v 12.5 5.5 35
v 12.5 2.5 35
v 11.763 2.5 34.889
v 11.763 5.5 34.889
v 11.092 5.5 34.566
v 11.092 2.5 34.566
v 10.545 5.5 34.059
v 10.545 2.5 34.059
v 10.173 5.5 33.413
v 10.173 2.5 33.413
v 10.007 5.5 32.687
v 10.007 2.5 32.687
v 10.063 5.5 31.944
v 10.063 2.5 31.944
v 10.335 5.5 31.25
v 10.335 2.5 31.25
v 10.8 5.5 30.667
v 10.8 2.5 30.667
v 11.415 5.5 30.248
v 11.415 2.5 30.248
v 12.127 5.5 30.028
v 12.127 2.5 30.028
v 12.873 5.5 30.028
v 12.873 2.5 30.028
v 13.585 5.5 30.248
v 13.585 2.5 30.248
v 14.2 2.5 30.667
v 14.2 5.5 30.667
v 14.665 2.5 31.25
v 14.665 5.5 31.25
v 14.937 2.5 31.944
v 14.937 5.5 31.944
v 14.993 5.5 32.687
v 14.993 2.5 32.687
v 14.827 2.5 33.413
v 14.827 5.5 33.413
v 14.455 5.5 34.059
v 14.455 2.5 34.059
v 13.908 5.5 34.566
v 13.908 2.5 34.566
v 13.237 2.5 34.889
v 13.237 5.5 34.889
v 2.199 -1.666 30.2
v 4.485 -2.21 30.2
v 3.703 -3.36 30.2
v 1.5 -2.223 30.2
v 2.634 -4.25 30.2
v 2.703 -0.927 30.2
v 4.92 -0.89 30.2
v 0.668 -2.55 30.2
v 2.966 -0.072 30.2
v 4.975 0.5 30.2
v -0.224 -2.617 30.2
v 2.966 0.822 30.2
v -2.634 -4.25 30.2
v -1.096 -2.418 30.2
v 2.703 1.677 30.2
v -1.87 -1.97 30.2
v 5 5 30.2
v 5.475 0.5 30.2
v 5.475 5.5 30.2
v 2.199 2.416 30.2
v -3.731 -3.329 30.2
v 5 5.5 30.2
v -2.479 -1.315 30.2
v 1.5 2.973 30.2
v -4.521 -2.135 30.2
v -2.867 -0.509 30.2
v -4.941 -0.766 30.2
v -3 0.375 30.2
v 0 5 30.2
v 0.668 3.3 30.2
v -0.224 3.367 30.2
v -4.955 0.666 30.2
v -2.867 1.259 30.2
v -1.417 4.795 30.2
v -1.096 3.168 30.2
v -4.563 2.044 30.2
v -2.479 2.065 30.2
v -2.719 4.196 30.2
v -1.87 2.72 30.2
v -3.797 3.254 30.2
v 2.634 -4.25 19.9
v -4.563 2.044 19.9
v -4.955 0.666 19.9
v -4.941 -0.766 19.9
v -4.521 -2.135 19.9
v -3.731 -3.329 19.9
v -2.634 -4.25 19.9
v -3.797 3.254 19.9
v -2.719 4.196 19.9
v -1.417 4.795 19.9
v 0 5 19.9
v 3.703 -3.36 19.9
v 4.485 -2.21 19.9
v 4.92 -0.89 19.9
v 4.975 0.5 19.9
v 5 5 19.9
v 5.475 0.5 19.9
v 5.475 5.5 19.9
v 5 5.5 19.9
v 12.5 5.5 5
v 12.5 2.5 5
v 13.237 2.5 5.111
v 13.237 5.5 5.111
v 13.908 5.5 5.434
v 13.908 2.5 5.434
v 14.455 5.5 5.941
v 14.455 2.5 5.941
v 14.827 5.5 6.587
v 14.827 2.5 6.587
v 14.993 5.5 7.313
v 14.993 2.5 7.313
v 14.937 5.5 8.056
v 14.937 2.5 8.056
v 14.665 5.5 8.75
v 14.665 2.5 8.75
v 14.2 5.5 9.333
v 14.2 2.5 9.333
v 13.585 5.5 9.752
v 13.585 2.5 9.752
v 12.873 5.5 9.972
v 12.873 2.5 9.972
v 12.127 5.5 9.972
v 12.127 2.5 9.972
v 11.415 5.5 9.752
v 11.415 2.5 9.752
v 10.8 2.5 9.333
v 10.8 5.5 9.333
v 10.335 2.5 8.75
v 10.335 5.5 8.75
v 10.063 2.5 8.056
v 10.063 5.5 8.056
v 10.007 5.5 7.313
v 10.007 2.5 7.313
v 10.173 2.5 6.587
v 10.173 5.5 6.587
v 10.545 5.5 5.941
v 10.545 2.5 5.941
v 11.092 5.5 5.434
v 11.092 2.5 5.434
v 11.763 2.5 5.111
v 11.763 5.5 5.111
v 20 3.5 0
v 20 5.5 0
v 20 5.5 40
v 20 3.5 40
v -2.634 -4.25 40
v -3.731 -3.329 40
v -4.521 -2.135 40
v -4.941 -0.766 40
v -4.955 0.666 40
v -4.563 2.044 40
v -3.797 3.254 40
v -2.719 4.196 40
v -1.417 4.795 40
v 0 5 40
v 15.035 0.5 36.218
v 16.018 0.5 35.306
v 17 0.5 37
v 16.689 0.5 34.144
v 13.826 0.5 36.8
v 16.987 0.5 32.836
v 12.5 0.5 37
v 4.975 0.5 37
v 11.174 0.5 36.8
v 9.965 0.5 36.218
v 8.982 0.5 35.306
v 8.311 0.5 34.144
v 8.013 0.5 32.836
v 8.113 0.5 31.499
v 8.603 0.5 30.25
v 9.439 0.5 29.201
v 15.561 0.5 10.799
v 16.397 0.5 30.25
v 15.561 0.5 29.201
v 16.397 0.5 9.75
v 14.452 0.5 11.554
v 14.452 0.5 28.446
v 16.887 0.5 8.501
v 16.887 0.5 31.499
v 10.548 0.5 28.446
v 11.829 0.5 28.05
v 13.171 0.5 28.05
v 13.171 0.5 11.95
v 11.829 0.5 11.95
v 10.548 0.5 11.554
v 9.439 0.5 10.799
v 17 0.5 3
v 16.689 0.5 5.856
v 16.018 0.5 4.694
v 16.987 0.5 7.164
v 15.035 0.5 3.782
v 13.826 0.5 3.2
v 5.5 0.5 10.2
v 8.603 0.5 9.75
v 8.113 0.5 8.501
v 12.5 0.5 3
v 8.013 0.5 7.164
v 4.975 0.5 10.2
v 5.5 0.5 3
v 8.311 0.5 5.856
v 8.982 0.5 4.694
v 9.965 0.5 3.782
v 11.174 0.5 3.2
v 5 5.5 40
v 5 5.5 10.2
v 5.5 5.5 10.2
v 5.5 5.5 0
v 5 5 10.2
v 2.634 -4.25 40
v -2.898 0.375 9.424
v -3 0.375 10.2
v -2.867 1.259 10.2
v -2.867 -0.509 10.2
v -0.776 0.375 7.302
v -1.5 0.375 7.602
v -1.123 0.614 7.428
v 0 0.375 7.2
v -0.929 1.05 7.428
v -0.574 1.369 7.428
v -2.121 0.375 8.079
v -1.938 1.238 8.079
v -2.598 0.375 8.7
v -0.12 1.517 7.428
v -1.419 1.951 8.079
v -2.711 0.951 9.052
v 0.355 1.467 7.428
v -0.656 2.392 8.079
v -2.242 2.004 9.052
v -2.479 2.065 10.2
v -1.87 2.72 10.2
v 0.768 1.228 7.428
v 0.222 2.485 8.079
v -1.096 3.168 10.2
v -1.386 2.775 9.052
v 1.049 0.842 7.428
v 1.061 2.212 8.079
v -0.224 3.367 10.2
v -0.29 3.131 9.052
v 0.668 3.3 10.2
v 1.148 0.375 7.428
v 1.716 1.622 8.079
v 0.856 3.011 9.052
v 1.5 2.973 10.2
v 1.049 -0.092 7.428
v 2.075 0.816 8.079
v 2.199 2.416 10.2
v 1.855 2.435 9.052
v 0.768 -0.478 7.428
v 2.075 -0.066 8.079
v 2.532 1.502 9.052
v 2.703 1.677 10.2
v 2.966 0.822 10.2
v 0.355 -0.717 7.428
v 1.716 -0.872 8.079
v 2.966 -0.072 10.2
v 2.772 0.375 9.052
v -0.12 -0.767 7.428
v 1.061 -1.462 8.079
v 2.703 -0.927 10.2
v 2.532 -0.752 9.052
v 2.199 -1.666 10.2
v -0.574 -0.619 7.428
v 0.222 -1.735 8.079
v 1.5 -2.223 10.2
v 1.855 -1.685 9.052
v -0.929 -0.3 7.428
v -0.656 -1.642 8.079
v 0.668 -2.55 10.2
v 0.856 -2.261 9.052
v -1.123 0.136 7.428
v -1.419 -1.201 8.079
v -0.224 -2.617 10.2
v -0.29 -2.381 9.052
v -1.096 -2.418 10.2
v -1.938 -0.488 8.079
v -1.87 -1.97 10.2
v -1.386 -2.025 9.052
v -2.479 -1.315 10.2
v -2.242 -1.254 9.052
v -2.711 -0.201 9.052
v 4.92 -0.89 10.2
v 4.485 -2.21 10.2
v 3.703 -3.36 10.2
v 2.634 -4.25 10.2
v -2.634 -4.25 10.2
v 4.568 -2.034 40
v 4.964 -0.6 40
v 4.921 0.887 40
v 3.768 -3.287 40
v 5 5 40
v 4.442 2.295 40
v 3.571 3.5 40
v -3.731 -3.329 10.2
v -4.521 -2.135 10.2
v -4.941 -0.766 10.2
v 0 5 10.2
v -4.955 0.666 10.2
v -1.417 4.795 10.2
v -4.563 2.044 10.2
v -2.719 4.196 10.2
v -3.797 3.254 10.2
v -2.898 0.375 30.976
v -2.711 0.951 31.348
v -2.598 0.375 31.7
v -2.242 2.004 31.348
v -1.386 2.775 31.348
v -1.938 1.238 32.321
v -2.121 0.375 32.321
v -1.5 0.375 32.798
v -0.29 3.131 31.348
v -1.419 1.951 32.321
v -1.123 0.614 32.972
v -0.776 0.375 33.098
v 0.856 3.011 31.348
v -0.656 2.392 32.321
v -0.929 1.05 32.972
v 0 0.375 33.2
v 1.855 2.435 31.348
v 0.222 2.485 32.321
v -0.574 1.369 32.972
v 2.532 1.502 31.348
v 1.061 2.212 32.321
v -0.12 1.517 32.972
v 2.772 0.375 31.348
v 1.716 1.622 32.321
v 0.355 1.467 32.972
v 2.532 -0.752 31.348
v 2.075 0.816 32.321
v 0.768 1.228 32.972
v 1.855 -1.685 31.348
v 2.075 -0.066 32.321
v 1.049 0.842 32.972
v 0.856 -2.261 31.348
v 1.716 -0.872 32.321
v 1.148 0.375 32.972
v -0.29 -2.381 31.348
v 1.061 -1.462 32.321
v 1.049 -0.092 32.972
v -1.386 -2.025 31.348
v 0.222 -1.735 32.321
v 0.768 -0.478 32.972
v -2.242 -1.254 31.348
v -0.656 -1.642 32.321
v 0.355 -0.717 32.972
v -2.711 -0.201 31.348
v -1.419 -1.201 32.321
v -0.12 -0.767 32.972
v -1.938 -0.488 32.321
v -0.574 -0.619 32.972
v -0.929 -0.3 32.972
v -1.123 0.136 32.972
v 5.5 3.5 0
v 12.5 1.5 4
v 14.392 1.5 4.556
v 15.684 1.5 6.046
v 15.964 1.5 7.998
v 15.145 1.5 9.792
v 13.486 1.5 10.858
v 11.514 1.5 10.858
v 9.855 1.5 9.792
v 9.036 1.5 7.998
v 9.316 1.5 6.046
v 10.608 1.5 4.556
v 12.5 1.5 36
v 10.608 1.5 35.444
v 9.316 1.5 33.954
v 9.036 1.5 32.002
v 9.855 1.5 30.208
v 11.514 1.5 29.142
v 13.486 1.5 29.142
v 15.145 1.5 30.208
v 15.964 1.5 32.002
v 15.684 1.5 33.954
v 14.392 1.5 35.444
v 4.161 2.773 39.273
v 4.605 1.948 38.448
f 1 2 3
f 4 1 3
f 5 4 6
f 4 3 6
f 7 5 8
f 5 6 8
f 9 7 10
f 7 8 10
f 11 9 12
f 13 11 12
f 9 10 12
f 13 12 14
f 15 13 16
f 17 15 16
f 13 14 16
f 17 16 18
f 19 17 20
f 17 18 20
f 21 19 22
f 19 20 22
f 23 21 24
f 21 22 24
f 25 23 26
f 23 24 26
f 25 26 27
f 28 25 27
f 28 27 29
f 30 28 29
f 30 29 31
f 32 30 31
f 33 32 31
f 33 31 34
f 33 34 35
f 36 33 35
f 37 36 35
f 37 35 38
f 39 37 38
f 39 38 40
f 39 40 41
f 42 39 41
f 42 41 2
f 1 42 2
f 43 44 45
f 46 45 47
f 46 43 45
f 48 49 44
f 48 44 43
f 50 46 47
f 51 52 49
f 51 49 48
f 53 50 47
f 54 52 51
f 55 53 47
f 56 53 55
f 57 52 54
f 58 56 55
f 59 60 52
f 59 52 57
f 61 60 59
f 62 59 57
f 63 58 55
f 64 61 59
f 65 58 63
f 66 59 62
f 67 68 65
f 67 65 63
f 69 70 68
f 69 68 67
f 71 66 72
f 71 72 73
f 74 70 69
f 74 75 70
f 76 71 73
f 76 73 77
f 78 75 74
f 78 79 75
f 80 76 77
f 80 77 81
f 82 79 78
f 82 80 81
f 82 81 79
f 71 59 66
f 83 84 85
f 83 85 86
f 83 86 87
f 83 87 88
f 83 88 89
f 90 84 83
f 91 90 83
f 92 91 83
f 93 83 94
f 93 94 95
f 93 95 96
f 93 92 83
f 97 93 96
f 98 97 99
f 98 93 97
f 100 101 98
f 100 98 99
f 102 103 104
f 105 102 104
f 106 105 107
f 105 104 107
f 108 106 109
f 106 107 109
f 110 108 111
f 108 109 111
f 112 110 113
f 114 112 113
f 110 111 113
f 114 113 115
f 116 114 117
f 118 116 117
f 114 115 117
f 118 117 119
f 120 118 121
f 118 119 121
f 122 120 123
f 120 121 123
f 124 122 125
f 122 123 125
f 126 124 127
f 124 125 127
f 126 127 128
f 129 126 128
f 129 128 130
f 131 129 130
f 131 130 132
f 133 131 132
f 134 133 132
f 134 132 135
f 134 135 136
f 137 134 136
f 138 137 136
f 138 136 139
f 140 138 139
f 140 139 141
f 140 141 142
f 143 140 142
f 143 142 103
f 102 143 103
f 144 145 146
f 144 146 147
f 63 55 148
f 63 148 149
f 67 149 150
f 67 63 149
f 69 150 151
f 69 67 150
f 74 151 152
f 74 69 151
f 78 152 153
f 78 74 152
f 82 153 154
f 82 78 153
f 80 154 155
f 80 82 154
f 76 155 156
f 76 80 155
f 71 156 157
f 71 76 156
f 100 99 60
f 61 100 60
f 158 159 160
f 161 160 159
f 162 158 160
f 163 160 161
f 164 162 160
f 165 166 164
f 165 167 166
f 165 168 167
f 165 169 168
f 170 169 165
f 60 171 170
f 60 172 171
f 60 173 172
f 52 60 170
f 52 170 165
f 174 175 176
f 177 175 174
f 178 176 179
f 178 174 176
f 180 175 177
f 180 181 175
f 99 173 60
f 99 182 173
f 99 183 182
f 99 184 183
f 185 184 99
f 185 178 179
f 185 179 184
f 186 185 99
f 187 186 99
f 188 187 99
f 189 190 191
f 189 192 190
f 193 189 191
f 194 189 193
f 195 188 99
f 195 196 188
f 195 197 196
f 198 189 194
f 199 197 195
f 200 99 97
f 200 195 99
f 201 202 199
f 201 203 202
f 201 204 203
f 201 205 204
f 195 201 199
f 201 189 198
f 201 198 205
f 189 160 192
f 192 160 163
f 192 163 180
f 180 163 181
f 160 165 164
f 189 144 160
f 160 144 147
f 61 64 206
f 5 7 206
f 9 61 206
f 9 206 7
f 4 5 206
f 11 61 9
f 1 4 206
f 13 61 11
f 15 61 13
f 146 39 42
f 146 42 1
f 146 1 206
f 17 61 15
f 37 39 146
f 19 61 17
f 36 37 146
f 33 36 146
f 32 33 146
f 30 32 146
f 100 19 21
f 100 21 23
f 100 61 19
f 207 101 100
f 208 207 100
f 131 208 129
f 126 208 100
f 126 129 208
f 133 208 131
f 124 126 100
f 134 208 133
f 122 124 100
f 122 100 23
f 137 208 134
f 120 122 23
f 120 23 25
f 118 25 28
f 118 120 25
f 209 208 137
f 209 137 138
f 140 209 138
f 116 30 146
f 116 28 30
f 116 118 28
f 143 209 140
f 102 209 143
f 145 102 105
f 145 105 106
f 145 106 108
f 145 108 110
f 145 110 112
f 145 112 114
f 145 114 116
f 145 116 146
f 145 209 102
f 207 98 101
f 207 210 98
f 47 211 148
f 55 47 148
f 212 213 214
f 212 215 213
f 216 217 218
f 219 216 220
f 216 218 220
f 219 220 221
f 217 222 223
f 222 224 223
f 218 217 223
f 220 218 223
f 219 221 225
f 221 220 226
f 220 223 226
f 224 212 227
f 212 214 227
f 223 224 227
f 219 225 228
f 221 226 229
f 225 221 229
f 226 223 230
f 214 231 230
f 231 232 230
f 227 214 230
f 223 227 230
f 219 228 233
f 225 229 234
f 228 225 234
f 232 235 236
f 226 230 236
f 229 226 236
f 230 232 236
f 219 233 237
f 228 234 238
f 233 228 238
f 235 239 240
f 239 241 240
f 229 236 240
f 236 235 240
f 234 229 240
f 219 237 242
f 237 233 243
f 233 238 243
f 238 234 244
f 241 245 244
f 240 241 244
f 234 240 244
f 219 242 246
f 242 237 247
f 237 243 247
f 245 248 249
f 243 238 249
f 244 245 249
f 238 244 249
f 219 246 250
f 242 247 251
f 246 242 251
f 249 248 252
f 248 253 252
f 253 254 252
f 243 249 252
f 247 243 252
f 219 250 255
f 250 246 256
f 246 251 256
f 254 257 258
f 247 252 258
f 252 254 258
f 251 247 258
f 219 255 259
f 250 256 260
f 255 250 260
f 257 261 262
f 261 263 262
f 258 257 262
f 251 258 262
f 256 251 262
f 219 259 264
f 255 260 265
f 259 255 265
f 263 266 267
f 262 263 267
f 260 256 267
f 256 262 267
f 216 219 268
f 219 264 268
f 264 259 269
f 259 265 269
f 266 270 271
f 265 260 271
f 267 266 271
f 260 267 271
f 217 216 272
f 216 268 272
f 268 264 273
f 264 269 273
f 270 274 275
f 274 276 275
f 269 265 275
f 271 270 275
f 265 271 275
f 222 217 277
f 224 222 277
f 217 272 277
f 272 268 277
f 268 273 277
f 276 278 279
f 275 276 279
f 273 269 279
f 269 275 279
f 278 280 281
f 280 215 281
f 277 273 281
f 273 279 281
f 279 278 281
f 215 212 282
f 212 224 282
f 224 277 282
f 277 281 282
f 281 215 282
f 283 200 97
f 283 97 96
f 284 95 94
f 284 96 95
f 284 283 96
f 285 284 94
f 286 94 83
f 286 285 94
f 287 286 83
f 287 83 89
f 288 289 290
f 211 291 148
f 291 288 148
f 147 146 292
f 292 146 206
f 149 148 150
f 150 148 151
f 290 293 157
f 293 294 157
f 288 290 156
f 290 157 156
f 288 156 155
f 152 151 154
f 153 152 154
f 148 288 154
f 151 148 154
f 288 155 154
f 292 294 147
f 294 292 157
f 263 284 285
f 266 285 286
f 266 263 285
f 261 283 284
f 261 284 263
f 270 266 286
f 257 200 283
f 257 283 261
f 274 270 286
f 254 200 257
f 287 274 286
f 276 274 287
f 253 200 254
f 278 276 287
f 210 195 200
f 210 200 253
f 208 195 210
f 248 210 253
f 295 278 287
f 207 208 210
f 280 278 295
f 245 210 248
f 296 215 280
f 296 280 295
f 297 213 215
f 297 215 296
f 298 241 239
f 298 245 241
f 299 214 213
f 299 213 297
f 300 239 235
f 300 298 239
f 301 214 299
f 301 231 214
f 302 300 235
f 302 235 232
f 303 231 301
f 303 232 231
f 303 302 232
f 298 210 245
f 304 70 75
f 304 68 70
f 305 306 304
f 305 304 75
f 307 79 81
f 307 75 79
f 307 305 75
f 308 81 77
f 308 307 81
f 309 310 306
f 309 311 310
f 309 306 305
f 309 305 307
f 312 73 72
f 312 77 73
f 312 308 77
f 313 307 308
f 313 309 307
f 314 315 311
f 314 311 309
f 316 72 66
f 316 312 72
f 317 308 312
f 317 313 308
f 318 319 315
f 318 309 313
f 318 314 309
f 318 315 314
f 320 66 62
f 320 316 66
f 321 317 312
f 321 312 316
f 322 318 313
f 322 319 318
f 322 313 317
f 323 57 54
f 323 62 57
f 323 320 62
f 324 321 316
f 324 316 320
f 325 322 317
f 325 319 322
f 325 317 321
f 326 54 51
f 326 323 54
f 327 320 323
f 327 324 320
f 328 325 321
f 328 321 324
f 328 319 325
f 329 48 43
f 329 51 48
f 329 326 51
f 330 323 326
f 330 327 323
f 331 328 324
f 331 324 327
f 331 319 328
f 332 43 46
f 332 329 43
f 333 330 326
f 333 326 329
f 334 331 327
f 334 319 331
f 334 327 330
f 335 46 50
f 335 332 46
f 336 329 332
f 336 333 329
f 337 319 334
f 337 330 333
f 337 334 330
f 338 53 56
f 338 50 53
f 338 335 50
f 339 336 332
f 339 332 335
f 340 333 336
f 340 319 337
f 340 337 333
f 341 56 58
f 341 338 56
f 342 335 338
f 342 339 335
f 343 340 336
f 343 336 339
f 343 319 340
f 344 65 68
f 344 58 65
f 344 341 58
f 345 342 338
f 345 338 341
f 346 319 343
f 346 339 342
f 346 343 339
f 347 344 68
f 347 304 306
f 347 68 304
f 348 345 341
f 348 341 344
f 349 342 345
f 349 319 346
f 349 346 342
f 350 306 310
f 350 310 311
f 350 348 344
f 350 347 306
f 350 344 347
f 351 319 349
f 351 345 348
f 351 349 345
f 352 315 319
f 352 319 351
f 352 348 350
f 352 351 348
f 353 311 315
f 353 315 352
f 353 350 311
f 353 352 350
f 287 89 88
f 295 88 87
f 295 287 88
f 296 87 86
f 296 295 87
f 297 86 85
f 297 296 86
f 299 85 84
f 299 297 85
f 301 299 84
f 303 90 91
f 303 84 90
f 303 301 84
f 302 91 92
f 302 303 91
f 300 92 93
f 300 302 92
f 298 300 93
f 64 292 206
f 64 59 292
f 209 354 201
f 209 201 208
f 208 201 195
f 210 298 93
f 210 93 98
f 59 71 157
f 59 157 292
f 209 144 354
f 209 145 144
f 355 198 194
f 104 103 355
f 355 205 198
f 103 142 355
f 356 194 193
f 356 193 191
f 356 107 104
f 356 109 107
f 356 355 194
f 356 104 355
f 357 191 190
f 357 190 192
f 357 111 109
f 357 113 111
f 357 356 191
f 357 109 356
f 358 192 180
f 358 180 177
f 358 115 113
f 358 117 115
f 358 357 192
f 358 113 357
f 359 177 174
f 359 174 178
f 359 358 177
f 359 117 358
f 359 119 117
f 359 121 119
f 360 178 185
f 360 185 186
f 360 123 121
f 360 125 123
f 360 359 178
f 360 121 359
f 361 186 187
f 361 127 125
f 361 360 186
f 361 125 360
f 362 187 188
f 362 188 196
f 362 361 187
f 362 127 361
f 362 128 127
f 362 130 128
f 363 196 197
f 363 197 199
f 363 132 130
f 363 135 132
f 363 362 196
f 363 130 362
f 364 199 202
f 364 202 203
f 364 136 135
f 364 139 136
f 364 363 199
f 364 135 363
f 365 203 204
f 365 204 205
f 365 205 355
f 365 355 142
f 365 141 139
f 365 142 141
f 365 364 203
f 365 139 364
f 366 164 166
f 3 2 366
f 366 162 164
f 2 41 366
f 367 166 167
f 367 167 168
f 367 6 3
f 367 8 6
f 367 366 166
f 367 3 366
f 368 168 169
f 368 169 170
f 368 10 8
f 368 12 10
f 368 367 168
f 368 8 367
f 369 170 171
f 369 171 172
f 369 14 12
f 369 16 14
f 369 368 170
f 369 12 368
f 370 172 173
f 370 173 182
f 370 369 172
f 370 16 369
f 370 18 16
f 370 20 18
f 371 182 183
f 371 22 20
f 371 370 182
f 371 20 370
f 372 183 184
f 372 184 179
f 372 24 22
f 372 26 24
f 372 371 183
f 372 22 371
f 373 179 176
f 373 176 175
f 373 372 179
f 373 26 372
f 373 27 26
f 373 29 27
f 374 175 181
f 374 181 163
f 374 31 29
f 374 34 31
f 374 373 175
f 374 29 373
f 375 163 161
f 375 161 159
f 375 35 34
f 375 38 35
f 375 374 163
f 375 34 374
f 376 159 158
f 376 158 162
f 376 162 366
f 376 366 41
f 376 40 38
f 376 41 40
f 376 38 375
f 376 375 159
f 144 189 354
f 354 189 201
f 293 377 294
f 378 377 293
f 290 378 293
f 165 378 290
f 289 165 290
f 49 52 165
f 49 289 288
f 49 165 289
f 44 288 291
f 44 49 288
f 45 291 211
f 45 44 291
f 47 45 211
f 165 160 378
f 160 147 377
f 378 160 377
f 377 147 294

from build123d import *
from build123d.topology import SkipClean

# Parameters (mm, degrees)
IZIM1_R                     = 3.5
Y_KSEKLIK_EKSTR_ZYON1_DEPTH = 40
KES_EKSTR_ZYON1_DEPTH       = 46.058295574
KES_EKSTR_ZYON1_DEPTH_BACK  = 46.058295574
IZIM3_W                     = 10
IZIM3_H                     = 10
KES_EKSTR_ZYON2_DEPTH       = 46.771852704
IZIM5_R                     = 2.5
KES_EKSTR_ZYON4_DEPTH       = 46
PAH1_SIZE                   = 3
IZIM4_W                     = 0.5
IZIM4_H                     = 10
KES_EKSTR_ZYON5_DEPTH       = 46
PAH2_SIZE                   = 2
BOSS_EXTRUDE1_START         = -10
SKETCH1_R                   = 3.5
BOSS_EXTRUDE1_DEPTH         = 10
BOSS_EXTRUDE2_START         = -10
SKETCH2_R                   = 3.5
BOSS_EXTRUDE2_DEPTH         = 10
CUT_EXTRUDE1_DEPTH          = 0.2
CUT_EXTRUDE2_DEPTH          = 0.2
CUT_EXTRUDE3_START          = -0.1
CUT_EXTRUDE3_DEPTH          = 0.1


with BuildPart() as part:
    # Çizim1 → Yükseklik-Ekstrüzyon1 (new body)
    with BuildSketch(Plane.XY):
        with BuildLine():
            Line((0, 5), (5, 5))
            Line((5, 5), (5, 5.5))
            Line((5, 5.5), (20, 5.5))
            Line((20, 5.5), (20, 5))
            Line((20, 5), (20, 0.5))
            Line((20, 0.5), (4.974937186, 0.5))
            ThreePointArc((4.974937186, 0.5), (-3.354101966, -3.708099244), (0, 5))
        make_face()
        Circle(IZIM1_R, mode=Mode.SUBTRACT)
    extrude(amount=Y_KSEKLIK_EKSTR_ZYON1_DEPTH)

    # Çizim2 → Kes-Ekstrüzyon1 (cut, two sides: drawn at the far end of the back side and taken through both)
    with BuildSketch(Plane.XY.offset(40).offset(-KES_EKSTR_ZYON1_DEPTH_BACK)):
        Polygon((-72.503925857, -4.25), (-6.336762511, -4.25), (12.42239056, -4.25), (78.589553905, -4.25), (78.589553905, -136.584326691), (-72.503925857, -136.584326691), align=None)
    extrude(amount=KES_EKSTR_ZYON1_DEPTH + KES_EKSTR_ZYON1_DEPTH_BACK, mode=Mode.SUBTRACT)

    # Çizim3 → Kes-Ekstrüzyon2 (cut, through all)
    with BuildSketch(Plane.XZ.offset(4.25)):
        with Locations((0, 25)):
            Rectangle(IZIM3_W, IZIM3_H)
        with Locations((0, 5)):
            Rectangle(IZIM3_W, IZIM3_H)
    extrude(amount=-KES_EKSTR_ZYON2_DEPTH, mode=Mode.SUBTRACT)

    # Çizim5 → Kes-Ekstrüzyon4 (cut, through all)
    with BuildSketch(Plane.XZ.offset(-0.5)):
        with Locations(Location((12.5, 7.5, 0), (0, 0, 270))):
            Circle(IZIM5_R)
        with Locations(Location((12.5, 32.5, 0), (0, 0, 90))):
            Circle(IZIM5_R)
    extrude(amount=-KES_EKSTR_ZYON4_DEPTH, mode=Mode.SUBTRACT)

    # Pah1
    pah1_edges = [part.edges().sort_by_distance(p)[0] for p in [
        (20, 0.5, 20),
        (12.487468593, 0.5, 40),
        (12.5, 0.5, 0),
    ]]
    chamfer(pah1_edges, length=PAH1_SIZE)

    # Çizim4 → Kes-Ekstrüzyon5 (cut, through all)
    with BuildSketch(Plane.XZ.offset(-0.5)):
        with Locations((5.224937186, 25)):
            Rectangle(IZIM4_W, IZIM4_H)
        with Locations((5.25, 5)):
            Rectangle(IZIM4_W, IZIM4_H)
    extrude(amount=-KES_EKSTR_ZYON5_DEPTH, mode=Mode.SUBTRACT)

    # Pah2
    pah2_edges = [part.edges().sort_by_distance(p)[0] for p in [
        (12.5, 0.5, 10),
        (12.5, 0.5, 30),
    ]]
    chamfer(pah2_edges, length=PAH2_SIZE - 0.0001)  # a hair under: the kernel refuses the full size

    # Sketch1 → Boss-Extrude1 (add)
    with BuildSketch(Plane.XY.offset(40).offset(BOSS_EXTRUDE1_START)):
        with Locations(Location((0, 0, 0), (0, 0, 180))):
            Circle(SKETCH1_R)
    extrude(amount=BOSS_EXTRUDE1_DEPTH)

    # Sketch2 → Boss-Extrude2 (add)
    with BuildSketch(Plane.XY.offset(20).offset(BOSS_EXTRUDE2_START)):
        Circle(SKETCH2_R)
    extrude(amount=BOSS_EXTRUDE2_DEPTH)

    # Sketch3 → Cut-Extrude1 (cut)
    with BuildSketch(Plane(origin=(0, 0, 30), x_dir=(-1, 0, 0), z_dir=(0, 0, -1))):
        with BuildLine():
            Line((0, 5), (-5, 5))
            Line((-5, 5), (-5, 5.5))
            Line((-5, 5.5), (-5.474937186, 5.5))
            Line((-5.474937186, 5.5), (-5.474937186, 0.5))
            Line((-5.474937186, 0.5), (-4.974937186, 0.5))
            ThreePointArc((-4.974937186, 0.5), (-4.484894308, -2.210367175), (-2.633913438, -4.25))
            Line((-2.633913438, -4.25), (2.633913438, -4.25))
            ThreePointArc((2.633913438, -4.25), (4.808846015, 1.369306394), (0, 5))
        make_face()
    extrude(amount=-CUT_EXTRUDE1_DEPTH, mode=Mode.SUBTRACT)

    # Sketch4 → Cut-Extrude2 (cut)
    with BuildSketch(Plane(origin=(0, 0, 10), x_dir=(-1, 0, 0), z_dir=(0, 0, -1))):
        with BuildLine():
            Line((-2.633913438, -4.25), (2.633913438, -4.25))
            ThreePointArc((2.633913438, -4.25), (4.808846015, 1.369306394), (0, 5))
            Line((0, 5), (-5, 5))
            Line((-5, 5), (-5, 5.5))
            Line((-5, 5.5), (-5.5, 5.5))
            Line((-5.5, 5.5), (-5.5, 0.5))
            Line((-5.5, 0.5), (-4.974937186, 0.5))
            ThreePointArc((-4.974937186, 0.5), (-4.484894308, -2.210367175), (-2.633913438, -4.25))
        make_face()
    extrude(amount=-CUT_EXTRUDE2_DEPTH, mode=Mode.SUBTRACT)

    # Sketch5 → Cut-Extrude3 (cut)
    with BuildSketch(Plane.XY.offset(20).offset(CUT_EXTRUDE3_START)):
        with BuildLine():
            Line((4.974937186, 0.5), (5.474937186, 0.5))
            Line((5.474937186, 0.5), (5.474937186, 5.5))
            Line((5.474937186, 5.5), (5, 5.5))
            Line((5, 5.5), (5, 5))
            Line((5, 5), (0, 5))
            ThreePointArc((0, 5), (-4.808846015, 1.369306394), (-2.633913438, -4.25))
            Line((-2.633913438, -4.25), (2.633913438, -4.25))
            ThreePointArc((2.633913438, -4.25), (4.484894308, -2.210367175), (4.974937186, 0.5))
        make_face()
    extrude(amount=CUT_EXTRUDE3_DEPTH, mode=Mode.SUBTRACT)

    # Sketch6 → Revolve1 (revolve)
    with BuildSketch(Plane(origin=(0, 0.375, 0), x_dir=(-1, 0, 0), z_dir=(0, -1, 0)), mode=Mode.PRIVATE) as revolve1_sk:
        with BuildLine():
            ThreePointArc((0, -7.2), (-3, -10.2), (0, -13.2))
            Line((0, -13.2), (0, -7.2))
        make_face()
        with BuildLine():
            Line((0, -7.2), (0, -13.2))
            ThreePointArc((0, -13.2), (2.121320344, -12.321320344), (3, -10.2))
            ThreePointArc((3, -10.2), (2.121320344, -8.078679656), (0, -7.2))
        make_face()
    revolve(revolve1_sk.sketch.rotate(Axis((0, 0.375, 13.2), (0, 0, -1)), 180), axis=Axis((0, 0.375, 13.2), (0, 0, -1)))

    # Sketch6<7> → Cut-Revolve1 (revolve, cut)
    with SkipClean():  # the faces are left unmerged after this step: merging them gives an invalid solid
        with BuildSketch(Plane(origin=(0, 0.375, 0), x_dir=(-1, 0, 0), z_dir=(0, -1, 0)), mode=Mode.PRIVATE) as cut_revolve1_sk:
            with BuildLine():
                ThreePointArc((0, -27.2), (-3, -30.2), (0, -33.2))
                Line((0, -33.2), (0, -27.2))
            make_face()
            with BuildLine():
                Line((0, -27.2), (0, -33.2))
                ThreePointArc((0, -33.2), (2.121320344, -32.321320344), (3, -30.2))
                ThreePointArc((3, -30.2), (2.121320344, -28.078679656), (0, -27.2))
            make_face()
        revolve(cut_revolve1_sk.sketch.rotate(Axis((0, 0.375, 33.2), (0, 0, -1)), 180), axis=Axis((0, 0.375, 33.2), (0, 0, -1)), mode=Mode.SUBTRACT)
    add(part.part.scale(1), mode=Mode.REPLACE)  # the faces are merged on a copy


solid = part.part
